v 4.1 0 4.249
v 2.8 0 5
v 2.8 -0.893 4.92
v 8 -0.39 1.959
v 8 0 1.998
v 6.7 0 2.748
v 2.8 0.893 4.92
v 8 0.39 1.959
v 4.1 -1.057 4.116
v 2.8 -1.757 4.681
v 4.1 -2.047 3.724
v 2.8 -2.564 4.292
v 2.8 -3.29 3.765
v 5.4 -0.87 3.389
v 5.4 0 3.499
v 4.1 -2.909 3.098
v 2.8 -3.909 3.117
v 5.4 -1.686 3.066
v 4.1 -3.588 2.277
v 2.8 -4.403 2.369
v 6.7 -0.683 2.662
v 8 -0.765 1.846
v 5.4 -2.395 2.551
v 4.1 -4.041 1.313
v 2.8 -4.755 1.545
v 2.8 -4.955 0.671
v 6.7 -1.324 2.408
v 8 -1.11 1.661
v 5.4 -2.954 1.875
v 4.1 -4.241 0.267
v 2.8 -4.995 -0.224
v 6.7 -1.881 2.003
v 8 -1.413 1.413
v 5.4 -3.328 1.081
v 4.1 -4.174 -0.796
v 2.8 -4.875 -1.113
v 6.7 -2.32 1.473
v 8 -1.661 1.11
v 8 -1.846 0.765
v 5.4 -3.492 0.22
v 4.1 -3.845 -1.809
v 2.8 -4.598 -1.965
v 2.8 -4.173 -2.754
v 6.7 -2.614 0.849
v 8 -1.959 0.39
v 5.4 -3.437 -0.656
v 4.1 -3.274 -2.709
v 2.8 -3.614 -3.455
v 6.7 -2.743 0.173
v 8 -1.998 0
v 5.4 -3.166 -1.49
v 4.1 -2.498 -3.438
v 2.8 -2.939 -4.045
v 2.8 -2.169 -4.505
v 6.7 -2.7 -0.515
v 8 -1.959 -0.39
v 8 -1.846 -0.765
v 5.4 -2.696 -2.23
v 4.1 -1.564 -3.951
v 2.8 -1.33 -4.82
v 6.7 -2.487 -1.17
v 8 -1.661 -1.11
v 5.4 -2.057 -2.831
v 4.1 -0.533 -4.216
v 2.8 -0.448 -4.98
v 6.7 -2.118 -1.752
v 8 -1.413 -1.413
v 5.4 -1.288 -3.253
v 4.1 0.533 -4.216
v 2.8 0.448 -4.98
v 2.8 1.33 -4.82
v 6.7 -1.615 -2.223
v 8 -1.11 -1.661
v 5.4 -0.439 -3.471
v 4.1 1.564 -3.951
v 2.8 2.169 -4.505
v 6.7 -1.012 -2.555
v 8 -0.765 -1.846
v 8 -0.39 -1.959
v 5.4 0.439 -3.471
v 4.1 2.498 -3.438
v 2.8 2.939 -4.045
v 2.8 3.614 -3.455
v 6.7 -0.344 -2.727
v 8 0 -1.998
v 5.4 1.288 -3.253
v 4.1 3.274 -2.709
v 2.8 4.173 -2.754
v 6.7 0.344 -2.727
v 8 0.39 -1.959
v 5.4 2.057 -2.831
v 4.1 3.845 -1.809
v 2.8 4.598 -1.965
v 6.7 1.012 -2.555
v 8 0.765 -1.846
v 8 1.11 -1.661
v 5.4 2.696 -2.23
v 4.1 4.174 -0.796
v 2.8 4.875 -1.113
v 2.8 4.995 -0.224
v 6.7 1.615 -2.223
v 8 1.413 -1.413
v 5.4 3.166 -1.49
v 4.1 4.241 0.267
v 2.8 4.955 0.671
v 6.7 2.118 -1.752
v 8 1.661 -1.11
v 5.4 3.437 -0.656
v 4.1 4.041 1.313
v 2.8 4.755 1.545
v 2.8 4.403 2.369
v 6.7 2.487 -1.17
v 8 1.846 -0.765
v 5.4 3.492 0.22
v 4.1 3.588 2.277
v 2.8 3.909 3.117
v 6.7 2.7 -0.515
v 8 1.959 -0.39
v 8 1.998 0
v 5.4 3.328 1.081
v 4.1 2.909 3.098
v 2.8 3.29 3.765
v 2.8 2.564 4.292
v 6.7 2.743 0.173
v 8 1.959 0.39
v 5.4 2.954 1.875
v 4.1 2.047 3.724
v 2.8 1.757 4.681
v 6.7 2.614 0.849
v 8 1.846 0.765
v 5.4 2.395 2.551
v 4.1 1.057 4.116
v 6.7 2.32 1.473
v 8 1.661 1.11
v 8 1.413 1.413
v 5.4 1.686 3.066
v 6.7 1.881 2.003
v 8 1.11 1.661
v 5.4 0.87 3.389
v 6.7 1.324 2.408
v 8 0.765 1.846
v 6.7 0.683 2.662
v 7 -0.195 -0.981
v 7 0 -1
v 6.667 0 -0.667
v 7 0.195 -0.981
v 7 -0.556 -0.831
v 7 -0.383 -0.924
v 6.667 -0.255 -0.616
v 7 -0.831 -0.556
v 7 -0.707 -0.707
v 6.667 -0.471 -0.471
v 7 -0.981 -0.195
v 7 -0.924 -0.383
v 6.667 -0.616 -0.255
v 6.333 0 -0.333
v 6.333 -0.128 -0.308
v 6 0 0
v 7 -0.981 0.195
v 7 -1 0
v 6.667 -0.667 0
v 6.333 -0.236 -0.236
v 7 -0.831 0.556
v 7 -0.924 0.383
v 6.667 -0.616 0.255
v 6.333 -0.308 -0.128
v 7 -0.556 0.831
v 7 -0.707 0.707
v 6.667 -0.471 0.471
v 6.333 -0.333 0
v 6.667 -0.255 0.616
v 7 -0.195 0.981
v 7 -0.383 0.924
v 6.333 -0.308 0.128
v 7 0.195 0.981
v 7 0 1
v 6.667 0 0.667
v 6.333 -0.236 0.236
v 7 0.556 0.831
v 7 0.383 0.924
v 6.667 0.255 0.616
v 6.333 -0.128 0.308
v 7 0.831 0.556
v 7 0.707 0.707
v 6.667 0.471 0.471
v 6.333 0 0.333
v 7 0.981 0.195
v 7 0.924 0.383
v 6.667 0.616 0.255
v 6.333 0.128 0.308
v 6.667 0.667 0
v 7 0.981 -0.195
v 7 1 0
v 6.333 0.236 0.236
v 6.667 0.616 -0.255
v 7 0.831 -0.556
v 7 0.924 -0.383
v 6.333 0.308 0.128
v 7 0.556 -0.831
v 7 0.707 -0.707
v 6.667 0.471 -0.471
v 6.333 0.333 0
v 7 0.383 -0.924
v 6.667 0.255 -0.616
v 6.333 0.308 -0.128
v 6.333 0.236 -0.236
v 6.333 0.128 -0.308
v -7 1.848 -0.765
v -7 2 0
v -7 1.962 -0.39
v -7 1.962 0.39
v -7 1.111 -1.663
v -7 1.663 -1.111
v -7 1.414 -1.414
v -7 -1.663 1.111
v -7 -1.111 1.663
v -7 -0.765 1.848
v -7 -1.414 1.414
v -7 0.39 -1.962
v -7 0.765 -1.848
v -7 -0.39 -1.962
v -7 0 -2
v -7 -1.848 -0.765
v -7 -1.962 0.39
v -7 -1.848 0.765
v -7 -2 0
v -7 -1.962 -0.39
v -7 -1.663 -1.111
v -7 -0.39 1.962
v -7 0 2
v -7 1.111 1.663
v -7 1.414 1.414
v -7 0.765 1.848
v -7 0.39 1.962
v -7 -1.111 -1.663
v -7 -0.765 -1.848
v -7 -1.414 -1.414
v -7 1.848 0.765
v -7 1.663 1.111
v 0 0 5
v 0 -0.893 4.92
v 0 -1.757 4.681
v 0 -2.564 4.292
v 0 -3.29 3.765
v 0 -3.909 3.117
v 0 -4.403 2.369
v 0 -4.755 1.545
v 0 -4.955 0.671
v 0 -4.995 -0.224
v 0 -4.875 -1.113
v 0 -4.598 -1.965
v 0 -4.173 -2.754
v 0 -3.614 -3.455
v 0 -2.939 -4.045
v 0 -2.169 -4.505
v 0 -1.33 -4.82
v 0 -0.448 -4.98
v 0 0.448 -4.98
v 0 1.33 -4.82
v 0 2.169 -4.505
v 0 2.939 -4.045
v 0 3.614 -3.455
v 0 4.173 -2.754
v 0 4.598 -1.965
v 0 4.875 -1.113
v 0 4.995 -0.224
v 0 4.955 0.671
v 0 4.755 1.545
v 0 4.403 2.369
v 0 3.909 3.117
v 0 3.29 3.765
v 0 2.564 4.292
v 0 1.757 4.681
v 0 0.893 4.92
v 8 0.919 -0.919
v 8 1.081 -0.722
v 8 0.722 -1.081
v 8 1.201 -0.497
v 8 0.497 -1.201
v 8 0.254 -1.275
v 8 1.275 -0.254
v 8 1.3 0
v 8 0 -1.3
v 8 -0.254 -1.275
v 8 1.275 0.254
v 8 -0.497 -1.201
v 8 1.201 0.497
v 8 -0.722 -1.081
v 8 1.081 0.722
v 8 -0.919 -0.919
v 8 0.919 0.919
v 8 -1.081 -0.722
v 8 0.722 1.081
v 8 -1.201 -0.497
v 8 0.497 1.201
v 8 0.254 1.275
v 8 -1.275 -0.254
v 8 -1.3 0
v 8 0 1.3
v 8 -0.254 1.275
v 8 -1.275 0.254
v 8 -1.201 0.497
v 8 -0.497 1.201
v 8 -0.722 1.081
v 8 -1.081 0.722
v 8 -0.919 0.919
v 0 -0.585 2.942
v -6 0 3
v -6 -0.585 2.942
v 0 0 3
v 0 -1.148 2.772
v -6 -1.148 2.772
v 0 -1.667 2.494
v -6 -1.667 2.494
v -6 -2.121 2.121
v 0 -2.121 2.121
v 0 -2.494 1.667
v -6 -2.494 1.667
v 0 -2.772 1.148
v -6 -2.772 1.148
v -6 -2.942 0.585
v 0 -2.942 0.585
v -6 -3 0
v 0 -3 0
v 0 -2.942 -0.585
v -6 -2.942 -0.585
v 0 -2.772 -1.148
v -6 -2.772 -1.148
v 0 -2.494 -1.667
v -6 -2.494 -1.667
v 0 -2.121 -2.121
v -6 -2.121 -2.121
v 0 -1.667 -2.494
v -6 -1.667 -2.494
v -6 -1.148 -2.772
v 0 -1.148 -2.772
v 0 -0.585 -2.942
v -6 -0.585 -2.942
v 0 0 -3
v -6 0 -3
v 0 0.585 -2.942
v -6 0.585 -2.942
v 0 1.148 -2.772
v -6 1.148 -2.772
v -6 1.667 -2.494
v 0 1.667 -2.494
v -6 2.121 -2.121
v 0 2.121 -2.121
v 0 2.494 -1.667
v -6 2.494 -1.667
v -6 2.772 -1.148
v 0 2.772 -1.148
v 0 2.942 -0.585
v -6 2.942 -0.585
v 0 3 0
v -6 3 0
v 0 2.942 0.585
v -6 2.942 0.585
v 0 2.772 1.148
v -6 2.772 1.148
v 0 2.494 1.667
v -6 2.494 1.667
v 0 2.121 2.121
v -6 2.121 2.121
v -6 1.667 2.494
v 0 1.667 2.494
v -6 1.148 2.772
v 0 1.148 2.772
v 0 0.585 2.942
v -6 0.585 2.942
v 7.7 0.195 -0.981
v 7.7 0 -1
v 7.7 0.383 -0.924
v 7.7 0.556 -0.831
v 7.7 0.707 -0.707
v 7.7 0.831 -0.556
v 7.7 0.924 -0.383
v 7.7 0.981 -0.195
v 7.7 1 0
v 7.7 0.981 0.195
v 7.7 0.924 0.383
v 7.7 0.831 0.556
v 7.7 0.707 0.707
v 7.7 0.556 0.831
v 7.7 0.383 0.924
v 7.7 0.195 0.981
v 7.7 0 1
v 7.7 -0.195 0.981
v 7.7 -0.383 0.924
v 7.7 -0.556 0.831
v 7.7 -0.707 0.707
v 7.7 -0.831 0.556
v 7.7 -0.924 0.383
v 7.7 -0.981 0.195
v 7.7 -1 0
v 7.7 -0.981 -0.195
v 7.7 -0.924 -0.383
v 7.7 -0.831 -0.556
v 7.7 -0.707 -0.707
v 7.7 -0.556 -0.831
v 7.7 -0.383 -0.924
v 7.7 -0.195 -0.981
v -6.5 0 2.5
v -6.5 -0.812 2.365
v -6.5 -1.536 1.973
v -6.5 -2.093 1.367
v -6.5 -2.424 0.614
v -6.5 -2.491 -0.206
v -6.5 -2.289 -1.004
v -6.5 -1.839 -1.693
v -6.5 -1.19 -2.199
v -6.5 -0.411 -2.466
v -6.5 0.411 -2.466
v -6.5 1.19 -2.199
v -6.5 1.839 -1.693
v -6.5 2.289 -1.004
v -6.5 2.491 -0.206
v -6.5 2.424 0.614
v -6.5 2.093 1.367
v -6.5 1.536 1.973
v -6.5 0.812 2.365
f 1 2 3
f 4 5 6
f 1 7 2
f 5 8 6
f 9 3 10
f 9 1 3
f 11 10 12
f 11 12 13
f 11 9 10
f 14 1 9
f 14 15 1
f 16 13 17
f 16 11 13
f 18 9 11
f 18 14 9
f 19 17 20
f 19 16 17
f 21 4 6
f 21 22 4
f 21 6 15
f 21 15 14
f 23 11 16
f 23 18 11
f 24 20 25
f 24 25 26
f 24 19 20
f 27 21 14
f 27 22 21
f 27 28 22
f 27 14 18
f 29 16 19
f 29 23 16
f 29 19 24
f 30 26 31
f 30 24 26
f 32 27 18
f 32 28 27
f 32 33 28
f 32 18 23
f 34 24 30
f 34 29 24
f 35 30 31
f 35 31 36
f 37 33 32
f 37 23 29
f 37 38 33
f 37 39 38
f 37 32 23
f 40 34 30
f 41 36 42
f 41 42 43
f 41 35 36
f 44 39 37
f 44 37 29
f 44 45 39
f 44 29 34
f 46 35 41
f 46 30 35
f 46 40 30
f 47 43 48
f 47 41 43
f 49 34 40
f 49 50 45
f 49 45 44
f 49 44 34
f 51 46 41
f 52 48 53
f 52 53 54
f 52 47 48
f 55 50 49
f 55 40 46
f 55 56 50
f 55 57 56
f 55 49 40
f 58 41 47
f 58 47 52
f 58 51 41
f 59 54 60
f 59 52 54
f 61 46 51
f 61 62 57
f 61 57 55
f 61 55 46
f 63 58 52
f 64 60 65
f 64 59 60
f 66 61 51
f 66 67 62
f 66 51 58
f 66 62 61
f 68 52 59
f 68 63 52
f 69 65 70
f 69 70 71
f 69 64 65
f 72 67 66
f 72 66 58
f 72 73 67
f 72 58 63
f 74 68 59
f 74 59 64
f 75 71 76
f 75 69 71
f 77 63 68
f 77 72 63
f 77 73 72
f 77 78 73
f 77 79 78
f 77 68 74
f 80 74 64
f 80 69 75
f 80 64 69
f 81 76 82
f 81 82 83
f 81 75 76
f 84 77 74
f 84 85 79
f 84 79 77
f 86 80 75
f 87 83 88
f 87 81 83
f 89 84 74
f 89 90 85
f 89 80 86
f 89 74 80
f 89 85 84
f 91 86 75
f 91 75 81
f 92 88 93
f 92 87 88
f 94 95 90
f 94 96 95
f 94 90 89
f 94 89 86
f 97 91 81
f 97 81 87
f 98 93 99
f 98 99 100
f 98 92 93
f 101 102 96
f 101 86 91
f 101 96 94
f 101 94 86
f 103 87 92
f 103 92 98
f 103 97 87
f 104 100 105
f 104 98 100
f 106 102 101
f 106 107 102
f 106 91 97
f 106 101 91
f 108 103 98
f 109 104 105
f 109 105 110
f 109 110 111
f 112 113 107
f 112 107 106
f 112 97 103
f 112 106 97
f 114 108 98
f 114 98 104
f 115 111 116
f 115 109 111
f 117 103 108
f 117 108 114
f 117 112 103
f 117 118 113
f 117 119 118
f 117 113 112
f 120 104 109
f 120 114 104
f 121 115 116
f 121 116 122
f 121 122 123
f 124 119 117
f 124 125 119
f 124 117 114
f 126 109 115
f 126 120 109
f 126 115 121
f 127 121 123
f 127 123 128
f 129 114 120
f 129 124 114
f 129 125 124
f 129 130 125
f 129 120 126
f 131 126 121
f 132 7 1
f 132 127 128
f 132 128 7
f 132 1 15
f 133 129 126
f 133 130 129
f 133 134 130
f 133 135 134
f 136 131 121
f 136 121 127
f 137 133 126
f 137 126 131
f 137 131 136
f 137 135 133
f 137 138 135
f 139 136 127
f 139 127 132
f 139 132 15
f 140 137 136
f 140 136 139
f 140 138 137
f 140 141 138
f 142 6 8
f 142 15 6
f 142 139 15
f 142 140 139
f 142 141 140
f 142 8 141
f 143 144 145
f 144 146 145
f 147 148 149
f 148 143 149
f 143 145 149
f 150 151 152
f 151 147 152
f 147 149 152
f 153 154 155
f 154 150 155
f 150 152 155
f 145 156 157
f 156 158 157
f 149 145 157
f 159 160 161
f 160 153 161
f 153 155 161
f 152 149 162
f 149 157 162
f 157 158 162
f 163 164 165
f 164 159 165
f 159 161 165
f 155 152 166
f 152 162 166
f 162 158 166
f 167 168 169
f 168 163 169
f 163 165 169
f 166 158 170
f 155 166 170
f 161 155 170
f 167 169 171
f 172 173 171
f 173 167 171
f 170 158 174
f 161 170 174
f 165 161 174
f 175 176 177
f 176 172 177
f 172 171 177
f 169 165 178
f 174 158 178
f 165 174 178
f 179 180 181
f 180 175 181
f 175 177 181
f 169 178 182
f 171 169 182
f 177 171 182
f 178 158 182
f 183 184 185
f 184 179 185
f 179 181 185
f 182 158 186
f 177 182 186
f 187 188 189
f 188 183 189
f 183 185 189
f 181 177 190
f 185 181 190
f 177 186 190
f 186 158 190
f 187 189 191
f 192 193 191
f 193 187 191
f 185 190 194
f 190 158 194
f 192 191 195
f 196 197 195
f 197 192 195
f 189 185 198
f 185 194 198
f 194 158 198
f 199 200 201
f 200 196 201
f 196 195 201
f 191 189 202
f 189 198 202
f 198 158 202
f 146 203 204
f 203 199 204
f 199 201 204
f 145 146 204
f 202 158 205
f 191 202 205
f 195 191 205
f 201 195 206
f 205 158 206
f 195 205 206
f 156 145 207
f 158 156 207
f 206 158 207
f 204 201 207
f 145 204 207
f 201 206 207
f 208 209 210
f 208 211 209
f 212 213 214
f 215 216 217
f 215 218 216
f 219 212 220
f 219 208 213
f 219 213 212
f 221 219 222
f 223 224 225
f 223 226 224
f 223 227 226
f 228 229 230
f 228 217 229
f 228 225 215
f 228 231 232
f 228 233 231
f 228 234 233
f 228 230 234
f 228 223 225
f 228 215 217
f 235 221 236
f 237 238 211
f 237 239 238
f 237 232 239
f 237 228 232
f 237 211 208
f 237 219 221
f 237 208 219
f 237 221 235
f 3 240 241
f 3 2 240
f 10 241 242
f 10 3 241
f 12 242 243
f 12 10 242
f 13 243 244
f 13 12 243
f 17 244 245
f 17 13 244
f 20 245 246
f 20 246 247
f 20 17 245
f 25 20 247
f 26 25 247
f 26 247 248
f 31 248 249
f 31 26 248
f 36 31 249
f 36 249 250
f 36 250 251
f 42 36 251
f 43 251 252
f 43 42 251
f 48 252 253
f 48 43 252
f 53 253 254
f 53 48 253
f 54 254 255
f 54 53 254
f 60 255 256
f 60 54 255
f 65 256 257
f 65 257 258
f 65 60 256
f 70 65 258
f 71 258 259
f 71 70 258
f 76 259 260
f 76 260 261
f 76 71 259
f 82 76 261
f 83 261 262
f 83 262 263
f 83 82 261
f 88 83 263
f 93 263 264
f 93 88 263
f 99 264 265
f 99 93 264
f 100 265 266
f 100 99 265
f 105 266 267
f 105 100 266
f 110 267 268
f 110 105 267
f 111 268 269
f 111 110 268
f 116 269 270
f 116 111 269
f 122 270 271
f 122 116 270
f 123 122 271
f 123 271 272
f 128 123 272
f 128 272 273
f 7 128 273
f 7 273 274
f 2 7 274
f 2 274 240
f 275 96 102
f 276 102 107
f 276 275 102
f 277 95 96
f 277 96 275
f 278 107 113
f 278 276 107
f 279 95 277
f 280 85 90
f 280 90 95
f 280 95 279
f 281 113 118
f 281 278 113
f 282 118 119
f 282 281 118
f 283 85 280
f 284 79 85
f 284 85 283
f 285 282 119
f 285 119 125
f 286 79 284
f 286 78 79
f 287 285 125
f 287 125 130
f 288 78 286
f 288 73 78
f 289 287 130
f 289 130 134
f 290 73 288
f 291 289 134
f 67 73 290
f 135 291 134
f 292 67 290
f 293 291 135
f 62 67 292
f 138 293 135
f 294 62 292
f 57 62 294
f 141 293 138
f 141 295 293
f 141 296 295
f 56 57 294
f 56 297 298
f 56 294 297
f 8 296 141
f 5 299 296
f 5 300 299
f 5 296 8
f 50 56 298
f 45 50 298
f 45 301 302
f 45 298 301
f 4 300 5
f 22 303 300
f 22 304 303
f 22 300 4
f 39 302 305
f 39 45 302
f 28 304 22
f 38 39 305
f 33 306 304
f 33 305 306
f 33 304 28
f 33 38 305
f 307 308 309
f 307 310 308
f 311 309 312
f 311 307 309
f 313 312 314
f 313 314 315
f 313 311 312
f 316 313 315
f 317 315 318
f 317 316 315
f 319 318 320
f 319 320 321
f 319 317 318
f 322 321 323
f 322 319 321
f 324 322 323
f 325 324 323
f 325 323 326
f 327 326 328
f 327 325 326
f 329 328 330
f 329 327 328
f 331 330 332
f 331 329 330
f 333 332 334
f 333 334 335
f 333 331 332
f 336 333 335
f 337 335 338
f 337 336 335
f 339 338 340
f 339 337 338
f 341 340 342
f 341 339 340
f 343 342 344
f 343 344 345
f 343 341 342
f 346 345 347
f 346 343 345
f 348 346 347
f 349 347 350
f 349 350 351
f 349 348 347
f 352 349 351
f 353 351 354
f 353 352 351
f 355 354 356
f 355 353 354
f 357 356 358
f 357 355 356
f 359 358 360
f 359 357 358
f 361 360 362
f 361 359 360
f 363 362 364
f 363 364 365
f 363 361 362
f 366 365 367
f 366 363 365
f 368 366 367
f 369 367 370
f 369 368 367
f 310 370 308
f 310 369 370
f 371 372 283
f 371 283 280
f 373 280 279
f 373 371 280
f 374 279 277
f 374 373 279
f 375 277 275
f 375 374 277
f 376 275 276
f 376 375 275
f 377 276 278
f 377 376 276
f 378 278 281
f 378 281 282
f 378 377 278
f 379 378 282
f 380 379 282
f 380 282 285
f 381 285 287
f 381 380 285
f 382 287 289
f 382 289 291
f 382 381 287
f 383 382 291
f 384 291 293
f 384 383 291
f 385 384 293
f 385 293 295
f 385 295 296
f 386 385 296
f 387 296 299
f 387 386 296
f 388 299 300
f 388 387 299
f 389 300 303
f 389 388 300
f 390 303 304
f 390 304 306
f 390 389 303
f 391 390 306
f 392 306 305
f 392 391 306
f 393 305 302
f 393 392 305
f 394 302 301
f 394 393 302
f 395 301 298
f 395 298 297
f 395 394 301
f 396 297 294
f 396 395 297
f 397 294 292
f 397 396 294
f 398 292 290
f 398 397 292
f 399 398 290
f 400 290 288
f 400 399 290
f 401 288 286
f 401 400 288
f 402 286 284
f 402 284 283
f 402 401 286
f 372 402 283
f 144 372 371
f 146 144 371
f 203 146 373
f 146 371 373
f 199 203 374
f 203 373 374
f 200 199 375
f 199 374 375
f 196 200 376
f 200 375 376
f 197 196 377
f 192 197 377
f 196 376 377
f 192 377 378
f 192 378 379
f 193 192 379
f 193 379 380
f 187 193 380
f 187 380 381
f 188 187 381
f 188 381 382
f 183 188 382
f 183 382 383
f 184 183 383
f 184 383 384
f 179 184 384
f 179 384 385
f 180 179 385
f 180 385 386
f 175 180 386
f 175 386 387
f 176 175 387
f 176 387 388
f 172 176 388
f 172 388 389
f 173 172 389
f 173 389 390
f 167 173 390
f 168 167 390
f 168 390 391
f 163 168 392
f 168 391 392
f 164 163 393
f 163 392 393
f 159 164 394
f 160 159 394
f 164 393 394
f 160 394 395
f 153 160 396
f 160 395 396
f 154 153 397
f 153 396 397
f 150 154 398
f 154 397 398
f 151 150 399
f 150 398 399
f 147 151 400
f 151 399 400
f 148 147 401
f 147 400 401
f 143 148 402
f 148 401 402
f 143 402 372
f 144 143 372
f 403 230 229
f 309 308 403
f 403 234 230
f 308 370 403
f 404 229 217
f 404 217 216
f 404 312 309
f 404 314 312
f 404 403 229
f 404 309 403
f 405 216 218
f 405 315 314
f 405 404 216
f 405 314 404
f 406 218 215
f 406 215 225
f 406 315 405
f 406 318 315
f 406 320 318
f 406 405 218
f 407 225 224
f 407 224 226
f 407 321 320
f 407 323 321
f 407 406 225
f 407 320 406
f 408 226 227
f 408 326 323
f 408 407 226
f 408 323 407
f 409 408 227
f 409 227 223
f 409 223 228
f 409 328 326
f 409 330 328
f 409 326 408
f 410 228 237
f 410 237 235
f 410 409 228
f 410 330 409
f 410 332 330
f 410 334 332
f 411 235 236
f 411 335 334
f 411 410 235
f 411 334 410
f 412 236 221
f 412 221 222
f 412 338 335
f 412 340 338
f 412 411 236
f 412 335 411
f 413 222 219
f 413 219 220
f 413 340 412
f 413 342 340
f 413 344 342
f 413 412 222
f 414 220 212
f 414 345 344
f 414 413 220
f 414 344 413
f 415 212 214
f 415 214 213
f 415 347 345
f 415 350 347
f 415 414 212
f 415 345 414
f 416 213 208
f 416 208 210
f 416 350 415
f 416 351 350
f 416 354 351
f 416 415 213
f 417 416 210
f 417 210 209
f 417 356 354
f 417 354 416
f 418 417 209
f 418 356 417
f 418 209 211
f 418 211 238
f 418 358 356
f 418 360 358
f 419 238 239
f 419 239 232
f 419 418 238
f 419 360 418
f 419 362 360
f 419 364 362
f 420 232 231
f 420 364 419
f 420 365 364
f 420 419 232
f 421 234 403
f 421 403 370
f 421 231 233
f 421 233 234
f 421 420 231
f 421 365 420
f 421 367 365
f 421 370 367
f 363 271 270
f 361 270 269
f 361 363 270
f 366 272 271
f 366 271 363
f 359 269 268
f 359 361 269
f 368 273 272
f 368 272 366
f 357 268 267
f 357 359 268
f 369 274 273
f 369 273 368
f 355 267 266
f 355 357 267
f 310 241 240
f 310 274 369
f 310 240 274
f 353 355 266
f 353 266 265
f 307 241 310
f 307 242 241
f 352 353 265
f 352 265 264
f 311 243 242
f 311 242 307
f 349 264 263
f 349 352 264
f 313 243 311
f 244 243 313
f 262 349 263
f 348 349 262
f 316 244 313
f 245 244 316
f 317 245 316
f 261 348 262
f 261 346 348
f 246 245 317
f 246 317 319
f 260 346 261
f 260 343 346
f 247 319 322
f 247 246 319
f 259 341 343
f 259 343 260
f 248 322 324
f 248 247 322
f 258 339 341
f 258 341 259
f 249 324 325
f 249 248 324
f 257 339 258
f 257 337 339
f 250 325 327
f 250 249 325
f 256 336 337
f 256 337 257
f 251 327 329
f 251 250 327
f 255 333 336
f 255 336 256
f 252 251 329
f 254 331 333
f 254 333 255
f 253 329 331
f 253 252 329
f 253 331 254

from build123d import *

# Parameters (mm, degrees)
SKETCH2_R          = 1
CUT_EXTRUDE1_DEPTH = 0.3
CHAMFER1_SIZE      = 0.3
SKETCH3_R          = 1
CUT_EXTRUDE2_DEPTH = 0.7


with BuildPart() as part:
    # Sketch1 → Revolve1 (revolve)
    with BuildSketch(Plane(origin=(0, 0, 0), x_dir=(1, 0, 0), z_dir=(0, 1, 0)), mode=Mode.PRIVATE) as revolve1_sk:
        Polygon((-7, 0), (-7, 2), (-6, 3), (0, 3), (0, 5), (2.8, 5), (8, 1.9977786), (8, 0), align=None)
    revolve(revolve1_sk.sketch.rotate(Axis((-2.427745665, 0, 0), (1, 0, 0)), 180), axis=Axis((-2.427745665, 0, 0), (1, 0, 0)))

    # Sketch2 → Cut-Extrude1 (cut)
    with BuildSketch(Plane(origin=(8, 0, 0), x_dir=(0, 0, -1), z_dir=(1, 0, 0))):
        Circle(SKETCH2_R)
    extrude(amount=-CUT_EXTRUDE1_DEPTH, mode=Mode.SUBTRACT)

    # Chamfer1
    chamfer1_edges = [part.edges().sort_by_distance(p)[0] for p in [
        (8, 0, 1),
    ]]
    chamfer(chamfer1_edges, length=CHAMFER1_SIZE - 0.0001)  # a hair under: the kernel refuses the full size

    # Sketch3 → Cut-Extrude2 (cut)
    with BuildSketch(Plane(origin=(7.7, 0, 0), x_dir=(0, 0, -1), z_dir=(1, 0, 0))):
        Circle(SKETCH3_R)
    extrude(amount=-CUT_EXTRUDE2_DEPTH, mode=Mode.SUBTRACT)

    # Cut-Extrude3 cone 1 section (through the dimple's axis) → Cut-Extrude3 (revolve, cut)
    with BuildSketch(Plane(origin=(7, 0, 0), x_dir=(0, 0, -1), z_dir=(0, 1, 0))):
        Polygon((0, 0), (1, 0), (0, 1), align=None)
    revolve(axis=Axis((7, 0, 0), (-1, 0, 0)), mode=Mode.SUBTRACT)


solid = part.part
